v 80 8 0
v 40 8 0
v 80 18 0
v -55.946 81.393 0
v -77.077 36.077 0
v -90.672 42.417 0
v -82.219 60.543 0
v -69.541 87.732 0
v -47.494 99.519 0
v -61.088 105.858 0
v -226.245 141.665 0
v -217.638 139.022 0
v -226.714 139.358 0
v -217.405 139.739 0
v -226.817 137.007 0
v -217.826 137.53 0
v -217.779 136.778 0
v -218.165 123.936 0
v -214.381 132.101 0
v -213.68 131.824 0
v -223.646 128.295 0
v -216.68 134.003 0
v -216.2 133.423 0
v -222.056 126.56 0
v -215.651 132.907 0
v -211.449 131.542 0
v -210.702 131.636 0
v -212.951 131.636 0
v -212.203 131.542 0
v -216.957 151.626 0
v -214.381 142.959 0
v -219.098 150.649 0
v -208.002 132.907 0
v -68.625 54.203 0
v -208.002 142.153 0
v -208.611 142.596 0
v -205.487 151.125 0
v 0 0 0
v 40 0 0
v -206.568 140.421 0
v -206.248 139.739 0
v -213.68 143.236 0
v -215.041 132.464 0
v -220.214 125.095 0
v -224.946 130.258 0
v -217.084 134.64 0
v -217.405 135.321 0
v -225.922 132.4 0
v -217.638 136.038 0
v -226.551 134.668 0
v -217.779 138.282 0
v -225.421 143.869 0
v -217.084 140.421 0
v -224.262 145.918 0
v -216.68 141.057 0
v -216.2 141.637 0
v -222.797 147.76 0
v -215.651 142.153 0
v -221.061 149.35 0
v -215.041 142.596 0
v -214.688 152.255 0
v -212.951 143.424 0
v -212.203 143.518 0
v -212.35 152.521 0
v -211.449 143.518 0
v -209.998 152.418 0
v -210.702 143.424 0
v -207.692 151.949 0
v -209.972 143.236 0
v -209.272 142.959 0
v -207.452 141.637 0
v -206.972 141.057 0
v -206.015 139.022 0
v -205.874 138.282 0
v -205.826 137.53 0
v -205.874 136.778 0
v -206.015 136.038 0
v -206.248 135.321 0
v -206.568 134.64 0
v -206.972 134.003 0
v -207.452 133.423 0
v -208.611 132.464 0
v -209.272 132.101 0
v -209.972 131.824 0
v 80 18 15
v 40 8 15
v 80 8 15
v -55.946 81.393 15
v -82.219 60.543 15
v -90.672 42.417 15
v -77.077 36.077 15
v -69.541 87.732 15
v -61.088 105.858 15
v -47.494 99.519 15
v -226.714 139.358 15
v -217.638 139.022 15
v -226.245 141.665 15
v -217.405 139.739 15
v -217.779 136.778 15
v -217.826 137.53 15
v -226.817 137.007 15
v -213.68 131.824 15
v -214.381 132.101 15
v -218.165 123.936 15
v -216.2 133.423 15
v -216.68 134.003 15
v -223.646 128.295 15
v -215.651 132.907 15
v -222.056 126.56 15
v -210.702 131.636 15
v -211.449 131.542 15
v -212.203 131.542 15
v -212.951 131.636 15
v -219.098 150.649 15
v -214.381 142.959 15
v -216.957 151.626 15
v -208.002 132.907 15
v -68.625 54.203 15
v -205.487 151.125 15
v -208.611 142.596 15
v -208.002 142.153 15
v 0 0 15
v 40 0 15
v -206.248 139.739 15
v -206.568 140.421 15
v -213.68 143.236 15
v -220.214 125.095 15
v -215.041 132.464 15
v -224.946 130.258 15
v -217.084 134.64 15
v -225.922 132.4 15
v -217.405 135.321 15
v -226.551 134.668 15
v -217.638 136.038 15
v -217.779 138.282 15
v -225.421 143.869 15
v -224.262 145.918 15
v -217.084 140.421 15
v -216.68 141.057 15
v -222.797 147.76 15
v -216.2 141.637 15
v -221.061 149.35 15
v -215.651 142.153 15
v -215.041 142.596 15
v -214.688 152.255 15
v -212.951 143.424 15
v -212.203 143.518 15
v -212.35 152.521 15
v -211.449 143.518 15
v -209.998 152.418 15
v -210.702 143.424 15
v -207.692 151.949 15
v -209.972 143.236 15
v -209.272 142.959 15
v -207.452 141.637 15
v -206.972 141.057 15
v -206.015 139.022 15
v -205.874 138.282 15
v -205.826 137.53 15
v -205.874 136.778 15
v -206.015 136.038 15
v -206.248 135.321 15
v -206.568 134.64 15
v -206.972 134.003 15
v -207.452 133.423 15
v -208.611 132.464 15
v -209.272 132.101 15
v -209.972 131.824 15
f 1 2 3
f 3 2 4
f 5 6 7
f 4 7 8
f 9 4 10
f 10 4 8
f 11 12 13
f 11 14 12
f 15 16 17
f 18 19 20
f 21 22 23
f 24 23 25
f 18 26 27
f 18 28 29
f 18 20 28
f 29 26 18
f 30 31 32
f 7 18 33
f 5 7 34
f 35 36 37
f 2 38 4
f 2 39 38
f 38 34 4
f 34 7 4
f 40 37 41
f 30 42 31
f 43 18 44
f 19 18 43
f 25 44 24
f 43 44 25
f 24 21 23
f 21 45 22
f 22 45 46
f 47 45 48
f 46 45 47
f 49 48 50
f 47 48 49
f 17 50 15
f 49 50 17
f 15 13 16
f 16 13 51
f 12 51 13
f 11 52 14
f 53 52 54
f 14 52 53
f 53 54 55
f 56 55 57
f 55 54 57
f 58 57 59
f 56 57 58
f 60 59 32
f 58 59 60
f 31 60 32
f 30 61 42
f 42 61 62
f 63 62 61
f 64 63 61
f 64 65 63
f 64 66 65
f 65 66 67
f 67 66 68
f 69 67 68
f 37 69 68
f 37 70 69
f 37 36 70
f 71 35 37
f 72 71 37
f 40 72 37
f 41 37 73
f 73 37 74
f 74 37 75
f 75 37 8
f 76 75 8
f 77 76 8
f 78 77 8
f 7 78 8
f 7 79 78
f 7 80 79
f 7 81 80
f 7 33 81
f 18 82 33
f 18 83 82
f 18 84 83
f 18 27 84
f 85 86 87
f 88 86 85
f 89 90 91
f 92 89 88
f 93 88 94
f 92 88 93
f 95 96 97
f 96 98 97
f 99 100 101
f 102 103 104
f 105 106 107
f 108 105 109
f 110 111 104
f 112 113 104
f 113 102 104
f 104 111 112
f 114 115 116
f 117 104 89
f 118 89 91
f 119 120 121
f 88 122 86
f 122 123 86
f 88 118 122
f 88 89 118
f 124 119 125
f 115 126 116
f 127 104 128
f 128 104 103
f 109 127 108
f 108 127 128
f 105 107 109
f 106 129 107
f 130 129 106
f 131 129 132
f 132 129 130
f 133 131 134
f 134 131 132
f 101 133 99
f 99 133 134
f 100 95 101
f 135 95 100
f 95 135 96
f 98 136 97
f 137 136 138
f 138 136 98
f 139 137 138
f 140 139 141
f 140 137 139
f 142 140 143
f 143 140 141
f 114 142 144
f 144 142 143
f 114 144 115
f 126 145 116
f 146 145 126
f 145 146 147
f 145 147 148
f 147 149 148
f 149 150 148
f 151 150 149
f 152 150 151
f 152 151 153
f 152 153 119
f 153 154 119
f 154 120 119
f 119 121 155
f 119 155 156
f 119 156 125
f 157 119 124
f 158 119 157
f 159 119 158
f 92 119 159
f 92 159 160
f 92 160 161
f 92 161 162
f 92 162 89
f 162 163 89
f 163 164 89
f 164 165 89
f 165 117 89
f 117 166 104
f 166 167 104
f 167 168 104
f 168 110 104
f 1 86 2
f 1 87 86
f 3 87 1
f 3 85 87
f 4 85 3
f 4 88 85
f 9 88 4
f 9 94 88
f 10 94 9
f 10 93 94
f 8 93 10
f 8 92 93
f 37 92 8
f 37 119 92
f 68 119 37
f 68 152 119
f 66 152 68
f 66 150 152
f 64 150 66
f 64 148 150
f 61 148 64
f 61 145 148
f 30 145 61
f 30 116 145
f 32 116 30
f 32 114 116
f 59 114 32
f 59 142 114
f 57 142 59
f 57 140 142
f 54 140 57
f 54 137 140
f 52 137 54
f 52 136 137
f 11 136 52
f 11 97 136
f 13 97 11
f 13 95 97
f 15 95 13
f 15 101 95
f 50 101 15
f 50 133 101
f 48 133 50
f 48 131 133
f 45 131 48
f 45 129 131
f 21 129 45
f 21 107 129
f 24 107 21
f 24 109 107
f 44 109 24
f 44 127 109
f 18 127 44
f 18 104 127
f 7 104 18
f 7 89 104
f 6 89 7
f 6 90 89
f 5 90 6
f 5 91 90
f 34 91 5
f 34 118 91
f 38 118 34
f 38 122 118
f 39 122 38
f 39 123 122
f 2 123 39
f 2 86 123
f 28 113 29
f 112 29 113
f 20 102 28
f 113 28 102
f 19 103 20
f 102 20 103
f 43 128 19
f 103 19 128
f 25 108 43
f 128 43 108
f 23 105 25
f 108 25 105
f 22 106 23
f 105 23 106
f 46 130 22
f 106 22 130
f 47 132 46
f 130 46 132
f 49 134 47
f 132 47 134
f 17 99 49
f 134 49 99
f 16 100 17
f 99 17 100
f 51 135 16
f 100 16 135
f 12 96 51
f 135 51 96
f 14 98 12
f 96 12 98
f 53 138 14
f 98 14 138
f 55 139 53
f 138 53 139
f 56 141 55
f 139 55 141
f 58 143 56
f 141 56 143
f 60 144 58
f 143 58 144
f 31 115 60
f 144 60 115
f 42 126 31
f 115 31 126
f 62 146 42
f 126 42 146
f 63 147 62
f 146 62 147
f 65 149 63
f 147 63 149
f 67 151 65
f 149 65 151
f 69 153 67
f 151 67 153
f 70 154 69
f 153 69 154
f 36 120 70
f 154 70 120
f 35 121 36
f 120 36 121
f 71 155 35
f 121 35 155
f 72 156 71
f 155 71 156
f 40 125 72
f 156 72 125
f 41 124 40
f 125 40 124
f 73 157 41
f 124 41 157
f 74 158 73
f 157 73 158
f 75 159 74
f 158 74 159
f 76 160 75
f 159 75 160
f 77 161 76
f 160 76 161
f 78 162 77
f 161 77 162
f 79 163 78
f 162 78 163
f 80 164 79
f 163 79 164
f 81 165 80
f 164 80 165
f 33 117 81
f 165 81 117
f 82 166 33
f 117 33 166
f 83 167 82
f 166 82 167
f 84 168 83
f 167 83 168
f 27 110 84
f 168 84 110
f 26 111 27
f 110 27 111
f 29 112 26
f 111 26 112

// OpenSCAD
$fn = 50;

linear_extrude(height=15)
difference() {
    polygon(points=[
        // Part 1
        [0, 0],
        [40, 0],
        [40, 8],
        [80, 8],
        [80, 18],
        [-55.946168, 81.392739],
        [-47.493803, 99.518895],
        [-61.08842, 105.858169],
        [-69.540785, 87.732013],
        [-205.486953, 151.124752],
        // curve
        [-205.486953, 151.124752],
        [-207.691667, 151.949061],
        [-209.998187, 152.418328],
        [-212.349719, 152.520998],
        [-214.688362, 152.254543],
        [-216.956529, 151.625525],
        [-219.098371, 150.649431],
        [-221.061149, 149.350297],
        [-222.796532, 147.760111],
        [-224.26179, 145.918029],
        [-225.420844, 143.86941],
        [-226.245152, 141.664696],
        [-226.714419, 139.358176],
        [-226.817089, 137.006643],
        [-226.550635, 134.668001],
        [-225.921616, 132.399833],
        [-224.945522, 130.257991],
        [-223.646388, 128.295214],
        [-222.056202, 126.55983],
        [-220.21412, 125.094572],
        // Part 2
        [-218.165501, 123.935519],
        [-82.219333, 60.54278],
        [-90.671698, 42.416624],
        [-77.077081, 36.07735],
        [-68.624716, 54.203506],
        [0, 0]
    ]);

    // Hand end of stick: x=-211.826227, y=137.530136
    translate([-211.826227, 137.530136])
    circle(r=6);
}
